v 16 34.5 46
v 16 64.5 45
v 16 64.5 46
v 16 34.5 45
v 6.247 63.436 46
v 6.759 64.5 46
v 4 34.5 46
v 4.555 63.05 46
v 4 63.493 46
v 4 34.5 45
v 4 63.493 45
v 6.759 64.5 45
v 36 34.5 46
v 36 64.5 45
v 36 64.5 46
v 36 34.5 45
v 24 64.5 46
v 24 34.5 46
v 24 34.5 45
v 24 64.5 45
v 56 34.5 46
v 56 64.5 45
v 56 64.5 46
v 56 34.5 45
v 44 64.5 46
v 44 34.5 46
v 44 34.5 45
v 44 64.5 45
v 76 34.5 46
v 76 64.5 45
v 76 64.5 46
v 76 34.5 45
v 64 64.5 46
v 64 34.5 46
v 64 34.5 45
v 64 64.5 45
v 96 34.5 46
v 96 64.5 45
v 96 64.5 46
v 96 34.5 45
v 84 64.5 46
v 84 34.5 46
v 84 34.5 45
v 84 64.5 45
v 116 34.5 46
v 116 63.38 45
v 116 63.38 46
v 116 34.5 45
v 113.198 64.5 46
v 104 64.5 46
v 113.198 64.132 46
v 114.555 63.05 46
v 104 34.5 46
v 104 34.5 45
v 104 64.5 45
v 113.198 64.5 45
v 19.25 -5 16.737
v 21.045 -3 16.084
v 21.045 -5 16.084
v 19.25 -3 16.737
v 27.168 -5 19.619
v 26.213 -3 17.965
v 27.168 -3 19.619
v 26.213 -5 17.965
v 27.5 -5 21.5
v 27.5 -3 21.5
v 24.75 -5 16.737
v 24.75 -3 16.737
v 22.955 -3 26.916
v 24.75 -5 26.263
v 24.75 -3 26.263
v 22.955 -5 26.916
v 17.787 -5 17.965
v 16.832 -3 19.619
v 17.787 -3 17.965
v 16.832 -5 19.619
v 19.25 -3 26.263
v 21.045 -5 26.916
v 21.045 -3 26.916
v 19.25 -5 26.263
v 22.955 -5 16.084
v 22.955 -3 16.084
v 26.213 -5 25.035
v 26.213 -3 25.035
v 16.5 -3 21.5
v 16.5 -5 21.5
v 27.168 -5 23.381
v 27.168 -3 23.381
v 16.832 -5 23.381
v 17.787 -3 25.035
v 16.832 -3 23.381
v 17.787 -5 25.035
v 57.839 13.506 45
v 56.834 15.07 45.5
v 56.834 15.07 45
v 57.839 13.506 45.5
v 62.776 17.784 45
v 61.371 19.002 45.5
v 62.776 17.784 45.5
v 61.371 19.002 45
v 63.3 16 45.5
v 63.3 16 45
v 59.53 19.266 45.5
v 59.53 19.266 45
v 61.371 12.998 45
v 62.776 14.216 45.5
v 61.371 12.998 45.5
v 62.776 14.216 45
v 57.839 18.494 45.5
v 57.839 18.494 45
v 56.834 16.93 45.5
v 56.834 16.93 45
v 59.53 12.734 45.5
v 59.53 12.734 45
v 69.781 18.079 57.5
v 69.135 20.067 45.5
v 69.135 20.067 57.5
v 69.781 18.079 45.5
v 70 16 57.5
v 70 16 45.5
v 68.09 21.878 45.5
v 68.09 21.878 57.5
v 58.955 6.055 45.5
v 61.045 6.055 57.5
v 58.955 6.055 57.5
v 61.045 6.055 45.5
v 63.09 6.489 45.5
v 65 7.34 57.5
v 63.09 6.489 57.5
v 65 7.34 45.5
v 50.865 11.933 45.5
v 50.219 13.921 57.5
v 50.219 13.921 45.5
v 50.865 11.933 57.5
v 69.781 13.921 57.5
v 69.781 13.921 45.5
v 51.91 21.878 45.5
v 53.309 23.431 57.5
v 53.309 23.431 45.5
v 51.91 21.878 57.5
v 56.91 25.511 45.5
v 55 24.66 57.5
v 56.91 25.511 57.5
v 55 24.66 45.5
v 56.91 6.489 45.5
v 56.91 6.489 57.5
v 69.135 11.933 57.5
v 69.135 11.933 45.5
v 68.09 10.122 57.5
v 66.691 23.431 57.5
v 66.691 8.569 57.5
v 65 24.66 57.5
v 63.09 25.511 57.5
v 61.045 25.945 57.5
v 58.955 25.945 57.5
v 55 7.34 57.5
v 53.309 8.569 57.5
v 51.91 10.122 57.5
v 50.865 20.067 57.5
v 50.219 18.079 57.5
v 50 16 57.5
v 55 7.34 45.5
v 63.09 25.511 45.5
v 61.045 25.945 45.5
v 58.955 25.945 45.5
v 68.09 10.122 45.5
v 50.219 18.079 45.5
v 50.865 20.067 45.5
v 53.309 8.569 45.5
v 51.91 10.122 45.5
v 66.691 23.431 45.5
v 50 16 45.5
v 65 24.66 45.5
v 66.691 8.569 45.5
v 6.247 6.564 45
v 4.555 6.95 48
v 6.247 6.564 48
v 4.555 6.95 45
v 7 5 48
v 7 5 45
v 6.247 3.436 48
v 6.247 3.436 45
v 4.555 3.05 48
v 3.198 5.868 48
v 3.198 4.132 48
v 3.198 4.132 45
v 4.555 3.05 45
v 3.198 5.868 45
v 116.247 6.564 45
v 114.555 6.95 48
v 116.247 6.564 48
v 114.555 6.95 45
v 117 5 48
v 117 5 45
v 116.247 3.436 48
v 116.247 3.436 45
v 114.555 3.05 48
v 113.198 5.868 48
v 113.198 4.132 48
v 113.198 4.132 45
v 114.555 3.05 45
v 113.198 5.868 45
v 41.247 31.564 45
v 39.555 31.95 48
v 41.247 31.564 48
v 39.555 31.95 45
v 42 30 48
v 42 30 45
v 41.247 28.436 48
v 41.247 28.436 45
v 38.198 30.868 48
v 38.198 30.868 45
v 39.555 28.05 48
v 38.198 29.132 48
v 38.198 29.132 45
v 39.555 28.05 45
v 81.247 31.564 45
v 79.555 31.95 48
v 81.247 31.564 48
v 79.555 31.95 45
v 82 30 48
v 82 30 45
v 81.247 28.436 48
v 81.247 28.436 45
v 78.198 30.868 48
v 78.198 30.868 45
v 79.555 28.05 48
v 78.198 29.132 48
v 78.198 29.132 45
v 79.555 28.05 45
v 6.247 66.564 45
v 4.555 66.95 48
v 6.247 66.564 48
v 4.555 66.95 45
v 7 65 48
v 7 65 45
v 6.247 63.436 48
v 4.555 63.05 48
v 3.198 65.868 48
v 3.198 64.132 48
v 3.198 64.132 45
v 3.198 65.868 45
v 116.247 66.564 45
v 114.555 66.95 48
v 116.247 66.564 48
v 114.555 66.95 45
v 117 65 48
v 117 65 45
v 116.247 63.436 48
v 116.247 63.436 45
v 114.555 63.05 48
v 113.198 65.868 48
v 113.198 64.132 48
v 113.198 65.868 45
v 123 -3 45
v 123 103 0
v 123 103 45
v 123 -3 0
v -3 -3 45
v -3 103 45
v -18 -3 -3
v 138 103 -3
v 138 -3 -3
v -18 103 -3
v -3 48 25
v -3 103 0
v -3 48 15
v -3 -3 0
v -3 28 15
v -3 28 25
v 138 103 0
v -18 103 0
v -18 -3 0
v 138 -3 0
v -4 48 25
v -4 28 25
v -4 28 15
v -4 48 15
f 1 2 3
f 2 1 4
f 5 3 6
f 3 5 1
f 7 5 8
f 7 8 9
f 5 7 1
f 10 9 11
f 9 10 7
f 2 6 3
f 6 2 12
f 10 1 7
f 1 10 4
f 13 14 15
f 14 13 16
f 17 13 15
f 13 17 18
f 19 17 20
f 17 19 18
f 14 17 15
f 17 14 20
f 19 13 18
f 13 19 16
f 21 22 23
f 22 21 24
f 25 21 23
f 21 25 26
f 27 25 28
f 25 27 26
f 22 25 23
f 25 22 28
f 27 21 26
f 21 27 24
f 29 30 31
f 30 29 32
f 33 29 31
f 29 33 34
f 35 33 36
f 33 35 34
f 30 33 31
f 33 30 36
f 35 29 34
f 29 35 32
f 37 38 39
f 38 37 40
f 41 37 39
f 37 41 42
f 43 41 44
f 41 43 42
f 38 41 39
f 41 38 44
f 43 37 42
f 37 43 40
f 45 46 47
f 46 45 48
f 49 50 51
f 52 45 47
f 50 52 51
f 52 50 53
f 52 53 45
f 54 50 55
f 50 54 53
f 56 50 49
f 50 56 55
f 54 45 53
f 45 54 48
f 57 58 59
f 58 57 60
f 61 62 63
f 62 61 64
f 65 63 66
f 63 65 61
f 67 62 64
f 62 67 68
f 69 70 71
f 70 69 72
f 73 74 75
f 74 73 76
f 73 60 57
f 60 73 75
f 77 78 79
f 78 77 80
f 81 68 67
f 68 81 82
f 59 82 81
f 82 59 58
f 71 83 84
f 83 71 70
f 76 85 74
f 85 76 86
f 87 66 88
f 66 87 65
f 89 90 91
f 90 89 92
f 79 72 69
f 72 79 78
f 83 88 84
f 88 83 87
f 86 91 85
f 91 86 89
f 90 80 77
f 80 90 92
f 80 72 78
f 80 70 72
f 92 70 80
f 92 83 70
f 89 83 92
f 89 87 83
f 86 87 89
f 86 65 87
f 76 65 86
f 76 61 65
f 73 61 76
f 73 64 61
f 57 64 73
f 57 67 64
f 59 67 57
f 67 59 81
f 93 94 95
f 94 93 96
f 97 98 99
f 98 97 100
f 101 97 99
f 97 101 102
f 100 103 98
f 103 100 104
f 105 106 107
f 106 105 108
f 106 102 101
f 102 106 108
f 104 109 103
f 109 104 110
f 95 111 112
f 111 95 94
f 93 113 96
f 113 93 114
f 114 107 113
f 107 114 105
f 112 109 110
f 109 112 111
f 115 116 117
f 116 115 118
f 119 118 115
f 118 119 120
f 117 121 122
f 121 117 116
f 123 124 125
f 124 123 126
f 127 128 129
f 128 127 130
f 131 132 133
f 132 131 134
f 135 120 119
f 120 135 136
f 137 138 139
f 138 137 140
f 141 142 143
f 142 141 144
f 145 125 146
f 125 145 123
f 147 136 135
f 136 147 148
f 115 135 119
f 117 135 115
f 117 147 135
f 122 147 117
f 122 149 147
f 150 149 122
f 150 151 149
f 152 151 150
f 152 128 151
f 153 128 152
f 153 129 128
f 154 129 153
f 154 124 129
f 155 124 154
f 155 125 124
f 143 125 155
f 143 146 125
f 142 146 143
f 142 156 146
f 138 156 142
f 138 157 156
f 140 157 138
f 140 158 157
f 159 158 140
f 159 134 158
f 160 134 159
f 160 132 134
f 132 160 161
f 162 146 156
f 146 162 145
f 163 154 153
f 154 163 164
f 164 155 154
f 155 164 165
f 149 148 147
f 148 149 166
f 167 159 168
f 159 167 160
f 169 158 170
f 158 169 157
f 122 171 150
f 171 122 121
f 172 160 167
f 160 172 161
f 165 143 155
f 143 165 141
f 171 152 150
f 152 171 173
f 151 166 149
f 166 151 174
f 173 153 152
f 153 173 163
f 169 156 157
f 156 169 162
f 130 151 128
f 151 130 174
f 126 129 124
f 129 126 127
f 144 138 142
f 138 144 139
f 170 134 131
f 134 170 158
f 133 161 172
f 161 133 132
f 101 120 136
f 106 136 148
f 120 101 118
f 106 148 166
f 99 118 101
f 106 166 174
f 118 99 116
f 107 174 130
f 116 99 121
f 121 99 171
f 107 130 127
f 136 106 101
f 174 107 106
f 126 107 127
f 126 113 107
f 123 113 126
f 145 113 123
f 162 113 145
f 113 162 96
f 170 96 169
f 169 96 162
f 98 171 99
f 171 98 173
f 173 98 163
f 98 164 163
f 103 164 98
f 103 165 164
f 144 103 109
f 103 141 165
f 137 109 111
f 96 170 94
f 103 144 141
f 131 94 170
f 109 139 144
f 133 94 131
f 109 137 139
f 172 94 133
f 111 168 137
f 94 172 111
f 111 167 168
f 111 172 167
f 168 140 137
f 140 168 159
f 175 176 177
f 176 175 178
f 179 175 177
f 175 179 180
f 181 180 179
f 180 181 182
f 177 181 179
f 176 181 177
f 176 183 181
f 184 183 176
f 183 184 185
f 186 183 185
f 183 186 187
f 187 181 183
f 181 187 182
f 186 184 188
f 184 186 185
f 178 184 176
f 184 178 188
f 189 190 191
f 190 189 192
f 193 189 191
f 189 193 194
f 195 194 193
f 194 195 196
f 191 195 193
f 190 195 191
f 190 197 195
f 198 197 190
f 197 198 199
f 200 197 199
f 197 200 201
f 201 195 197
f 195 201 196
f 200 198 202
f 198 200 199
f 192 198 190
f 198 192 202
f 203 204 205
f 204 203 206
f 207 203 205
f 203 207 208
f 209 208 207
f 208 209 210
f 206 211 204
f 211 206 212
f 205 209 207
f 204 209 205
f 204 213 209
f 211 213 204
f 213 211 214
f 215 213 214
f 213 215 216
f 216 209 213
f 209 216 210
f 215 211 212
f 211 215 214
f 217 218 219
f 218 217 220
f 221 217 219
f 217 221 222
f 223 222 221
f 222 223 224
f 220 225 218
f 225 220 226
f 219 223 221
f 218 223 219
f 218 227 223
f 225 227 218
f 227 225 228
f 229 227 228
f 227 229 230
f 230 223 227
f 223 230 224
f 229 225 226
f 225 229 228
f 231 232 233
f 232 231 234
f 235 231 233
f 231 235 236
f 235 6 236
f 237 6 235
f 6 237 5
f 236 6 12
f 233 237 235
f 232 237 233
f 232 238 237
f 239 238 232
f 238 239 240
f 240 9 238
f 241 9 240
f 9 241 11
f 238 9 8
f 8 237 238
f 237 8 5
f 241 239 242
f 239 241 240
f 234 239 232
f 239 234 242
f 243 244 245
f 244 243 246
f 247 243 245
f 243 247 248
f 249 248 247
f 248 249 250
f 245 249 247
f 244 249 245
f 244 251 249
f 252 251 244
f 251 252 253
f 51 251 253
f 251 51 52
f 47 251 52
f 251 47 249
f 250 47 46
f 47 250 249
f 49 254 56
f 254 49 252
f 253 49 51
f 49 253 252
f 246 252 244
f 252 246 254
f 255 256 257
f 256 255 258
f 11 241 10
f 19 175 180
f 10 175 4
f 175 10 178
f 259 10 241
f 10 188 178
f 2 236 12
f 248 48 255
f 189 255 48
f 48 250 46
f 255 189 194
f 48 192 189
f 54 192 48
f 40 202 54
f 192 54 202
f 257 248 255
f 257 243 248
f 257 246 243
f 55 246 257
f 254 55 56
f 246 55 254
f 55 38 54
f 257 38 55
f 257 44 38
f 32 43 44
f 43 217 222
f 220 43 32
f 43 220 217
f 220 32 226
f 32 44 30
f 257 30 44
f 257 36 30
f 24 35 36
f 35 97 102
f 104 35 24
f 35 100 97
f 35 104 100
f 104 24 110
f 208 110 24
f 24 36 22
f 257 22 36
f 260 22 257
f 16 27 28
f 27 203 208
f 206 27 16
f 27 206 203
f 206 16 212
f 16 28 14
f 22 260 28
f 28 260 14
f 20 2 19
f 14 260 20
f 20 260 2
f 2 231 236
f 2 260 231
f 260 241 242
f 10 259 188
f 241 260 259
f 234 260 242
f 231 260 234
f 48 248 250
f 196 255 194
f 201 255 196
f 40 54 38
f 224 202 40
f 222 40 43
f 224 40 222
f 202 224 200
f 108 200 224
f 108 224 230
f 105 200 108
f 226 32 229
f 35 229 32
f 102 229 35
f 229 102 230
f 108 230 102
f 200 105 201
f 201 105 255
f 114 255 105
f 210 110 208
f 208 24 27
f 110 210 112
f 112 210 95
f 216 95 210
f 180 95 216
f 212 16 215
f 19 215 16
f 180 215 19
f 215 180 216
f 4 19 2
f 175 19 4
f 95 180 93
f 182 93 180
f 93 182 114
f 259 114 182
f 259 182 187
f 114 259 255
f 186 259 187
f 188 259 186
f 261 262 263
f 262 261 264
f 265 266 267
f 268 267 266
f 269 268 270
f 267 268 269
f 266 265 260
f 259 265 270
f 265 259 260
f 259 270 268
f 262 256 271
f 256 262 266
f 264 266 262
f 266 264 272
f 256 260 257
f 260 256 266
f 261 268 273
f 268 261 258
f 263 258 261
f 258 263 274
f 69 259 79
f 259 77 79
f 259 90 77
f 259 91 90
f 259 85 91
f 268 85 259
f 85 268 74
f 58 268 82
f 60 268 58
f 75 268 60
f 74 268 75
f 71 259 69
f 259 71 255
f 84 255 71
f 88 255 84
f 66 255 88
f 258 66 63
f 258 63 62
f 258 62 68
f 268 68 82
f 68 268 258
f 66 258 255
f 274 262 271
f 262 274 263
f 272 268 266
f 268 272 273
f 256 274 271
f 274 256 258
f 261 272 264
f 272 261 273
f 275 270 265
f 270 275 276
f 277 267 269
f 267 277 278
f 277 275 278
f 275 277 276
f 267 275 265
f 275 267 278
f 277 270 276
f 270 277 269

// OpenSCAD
translate([0,0,5.5-3.0]) pcba();

color("brown",alpha=0.2) translate([-3,-3,-3]) cube([120+3+3,100+3+3,48]);
color("brown",alpha=0.2) translate([-3-15,-3,-3]) cube([120+3+3+15+15,100+3+3,3]);
color("gray",alpha=0.9) translate([-4,28,15]) cube([10,20,10]);

module pcba(){
    color("green") translate([0,0,28]) cube([120,100,1.5]);         //PCB
    color("blue") translate([60,16,28+1.5+5]) cube([10,11,10],center=true);//pot
    color("gray") translate([82,4,0]) cube([28,23,28]);             //transformer
    translate([22,-5,28-9]) rotate([-90,0,0]) cylinder(33,5.5,5.5); //jack
    translate([12,0,28-0-16]) cube([20,21,16]);                     //jack body
    //translate([30,61,28+1.5]) cube([66,34,18]);
    translate([30,61,28+1.5-10-1.5]) cube([66,34,10]);              //component vol
    color("red") translate([65,62,28-18]) cube([17,13,18]);         //fazel inductor
    color("black") translate([0+8,0+50-16,0]) cube([17,49,26]);
    color("gray",alpha=0.5) translate([0+7-1,0+50-2-16,0-2]) rotate([0,0,0]) cube([18+3,50+3,27+3]);             //9V battery
    //color("black") translate([27+9,32+3,7]) cube([83-9-9,18,21]);           //dummy coil
    color("black") translate([27+9+7,32+3,7]) cube([70-9-9,18,21]);
    color("black") translate([27+9+7,32+9+3,7]) cylinder(21,9,9);           //dummy coil
    //color("black") translate([27+84-9,32+9+3,7]) cylinder(21,9,9);
    color("black") translate([27+70-9+7,32+9+3,7]) cylinder(21,9,9);    //dummy coil
    color("ivory",alpha=0.5) translate([27,32,7]) cube([84,24,20]);           //dummy coil
    color("gray") translate([104,72,28-8]) cube([5,25,8]);          //header
    
    for (i = [10 : 20 : 110]) {
        translate([i-4/2, 45, 28+1.5]) cube([4,9,6]);               //switches
        color("gray",alpha=0.9) translate([i-12/2+4/2-4/2, 45-30/2+9/2, 28+1.5]) cube([12,30,14]);
    } 
    
    color("gray") translate([60,16,28+1.5]) cylinder(25,3.3,3.3);
    color("ivory") translate([60,16,48-5]) cylinder(12,10,10);
    
    translate([5,5,-2.5]) cylinder(48,2,2);
    translate([120-5,5,-2.5]) cylinder(48,2,2);
    translate([40,30,-2.5]) cylinder(48,2,2);
    translate([120-40,30,-2.5]) cylinder(48,2,2);
    translate([5,65,-2.5]) cylinder(48,2,2);
    translate([120-5,65,-2.5]) cylinder(48,2,2);
}

//switches @ y = 50mm
//10, 30, 50, 70, 90, 110
//travel ammount: 2 mm
//4 x 9 x 6
//17 x 49 x 26
